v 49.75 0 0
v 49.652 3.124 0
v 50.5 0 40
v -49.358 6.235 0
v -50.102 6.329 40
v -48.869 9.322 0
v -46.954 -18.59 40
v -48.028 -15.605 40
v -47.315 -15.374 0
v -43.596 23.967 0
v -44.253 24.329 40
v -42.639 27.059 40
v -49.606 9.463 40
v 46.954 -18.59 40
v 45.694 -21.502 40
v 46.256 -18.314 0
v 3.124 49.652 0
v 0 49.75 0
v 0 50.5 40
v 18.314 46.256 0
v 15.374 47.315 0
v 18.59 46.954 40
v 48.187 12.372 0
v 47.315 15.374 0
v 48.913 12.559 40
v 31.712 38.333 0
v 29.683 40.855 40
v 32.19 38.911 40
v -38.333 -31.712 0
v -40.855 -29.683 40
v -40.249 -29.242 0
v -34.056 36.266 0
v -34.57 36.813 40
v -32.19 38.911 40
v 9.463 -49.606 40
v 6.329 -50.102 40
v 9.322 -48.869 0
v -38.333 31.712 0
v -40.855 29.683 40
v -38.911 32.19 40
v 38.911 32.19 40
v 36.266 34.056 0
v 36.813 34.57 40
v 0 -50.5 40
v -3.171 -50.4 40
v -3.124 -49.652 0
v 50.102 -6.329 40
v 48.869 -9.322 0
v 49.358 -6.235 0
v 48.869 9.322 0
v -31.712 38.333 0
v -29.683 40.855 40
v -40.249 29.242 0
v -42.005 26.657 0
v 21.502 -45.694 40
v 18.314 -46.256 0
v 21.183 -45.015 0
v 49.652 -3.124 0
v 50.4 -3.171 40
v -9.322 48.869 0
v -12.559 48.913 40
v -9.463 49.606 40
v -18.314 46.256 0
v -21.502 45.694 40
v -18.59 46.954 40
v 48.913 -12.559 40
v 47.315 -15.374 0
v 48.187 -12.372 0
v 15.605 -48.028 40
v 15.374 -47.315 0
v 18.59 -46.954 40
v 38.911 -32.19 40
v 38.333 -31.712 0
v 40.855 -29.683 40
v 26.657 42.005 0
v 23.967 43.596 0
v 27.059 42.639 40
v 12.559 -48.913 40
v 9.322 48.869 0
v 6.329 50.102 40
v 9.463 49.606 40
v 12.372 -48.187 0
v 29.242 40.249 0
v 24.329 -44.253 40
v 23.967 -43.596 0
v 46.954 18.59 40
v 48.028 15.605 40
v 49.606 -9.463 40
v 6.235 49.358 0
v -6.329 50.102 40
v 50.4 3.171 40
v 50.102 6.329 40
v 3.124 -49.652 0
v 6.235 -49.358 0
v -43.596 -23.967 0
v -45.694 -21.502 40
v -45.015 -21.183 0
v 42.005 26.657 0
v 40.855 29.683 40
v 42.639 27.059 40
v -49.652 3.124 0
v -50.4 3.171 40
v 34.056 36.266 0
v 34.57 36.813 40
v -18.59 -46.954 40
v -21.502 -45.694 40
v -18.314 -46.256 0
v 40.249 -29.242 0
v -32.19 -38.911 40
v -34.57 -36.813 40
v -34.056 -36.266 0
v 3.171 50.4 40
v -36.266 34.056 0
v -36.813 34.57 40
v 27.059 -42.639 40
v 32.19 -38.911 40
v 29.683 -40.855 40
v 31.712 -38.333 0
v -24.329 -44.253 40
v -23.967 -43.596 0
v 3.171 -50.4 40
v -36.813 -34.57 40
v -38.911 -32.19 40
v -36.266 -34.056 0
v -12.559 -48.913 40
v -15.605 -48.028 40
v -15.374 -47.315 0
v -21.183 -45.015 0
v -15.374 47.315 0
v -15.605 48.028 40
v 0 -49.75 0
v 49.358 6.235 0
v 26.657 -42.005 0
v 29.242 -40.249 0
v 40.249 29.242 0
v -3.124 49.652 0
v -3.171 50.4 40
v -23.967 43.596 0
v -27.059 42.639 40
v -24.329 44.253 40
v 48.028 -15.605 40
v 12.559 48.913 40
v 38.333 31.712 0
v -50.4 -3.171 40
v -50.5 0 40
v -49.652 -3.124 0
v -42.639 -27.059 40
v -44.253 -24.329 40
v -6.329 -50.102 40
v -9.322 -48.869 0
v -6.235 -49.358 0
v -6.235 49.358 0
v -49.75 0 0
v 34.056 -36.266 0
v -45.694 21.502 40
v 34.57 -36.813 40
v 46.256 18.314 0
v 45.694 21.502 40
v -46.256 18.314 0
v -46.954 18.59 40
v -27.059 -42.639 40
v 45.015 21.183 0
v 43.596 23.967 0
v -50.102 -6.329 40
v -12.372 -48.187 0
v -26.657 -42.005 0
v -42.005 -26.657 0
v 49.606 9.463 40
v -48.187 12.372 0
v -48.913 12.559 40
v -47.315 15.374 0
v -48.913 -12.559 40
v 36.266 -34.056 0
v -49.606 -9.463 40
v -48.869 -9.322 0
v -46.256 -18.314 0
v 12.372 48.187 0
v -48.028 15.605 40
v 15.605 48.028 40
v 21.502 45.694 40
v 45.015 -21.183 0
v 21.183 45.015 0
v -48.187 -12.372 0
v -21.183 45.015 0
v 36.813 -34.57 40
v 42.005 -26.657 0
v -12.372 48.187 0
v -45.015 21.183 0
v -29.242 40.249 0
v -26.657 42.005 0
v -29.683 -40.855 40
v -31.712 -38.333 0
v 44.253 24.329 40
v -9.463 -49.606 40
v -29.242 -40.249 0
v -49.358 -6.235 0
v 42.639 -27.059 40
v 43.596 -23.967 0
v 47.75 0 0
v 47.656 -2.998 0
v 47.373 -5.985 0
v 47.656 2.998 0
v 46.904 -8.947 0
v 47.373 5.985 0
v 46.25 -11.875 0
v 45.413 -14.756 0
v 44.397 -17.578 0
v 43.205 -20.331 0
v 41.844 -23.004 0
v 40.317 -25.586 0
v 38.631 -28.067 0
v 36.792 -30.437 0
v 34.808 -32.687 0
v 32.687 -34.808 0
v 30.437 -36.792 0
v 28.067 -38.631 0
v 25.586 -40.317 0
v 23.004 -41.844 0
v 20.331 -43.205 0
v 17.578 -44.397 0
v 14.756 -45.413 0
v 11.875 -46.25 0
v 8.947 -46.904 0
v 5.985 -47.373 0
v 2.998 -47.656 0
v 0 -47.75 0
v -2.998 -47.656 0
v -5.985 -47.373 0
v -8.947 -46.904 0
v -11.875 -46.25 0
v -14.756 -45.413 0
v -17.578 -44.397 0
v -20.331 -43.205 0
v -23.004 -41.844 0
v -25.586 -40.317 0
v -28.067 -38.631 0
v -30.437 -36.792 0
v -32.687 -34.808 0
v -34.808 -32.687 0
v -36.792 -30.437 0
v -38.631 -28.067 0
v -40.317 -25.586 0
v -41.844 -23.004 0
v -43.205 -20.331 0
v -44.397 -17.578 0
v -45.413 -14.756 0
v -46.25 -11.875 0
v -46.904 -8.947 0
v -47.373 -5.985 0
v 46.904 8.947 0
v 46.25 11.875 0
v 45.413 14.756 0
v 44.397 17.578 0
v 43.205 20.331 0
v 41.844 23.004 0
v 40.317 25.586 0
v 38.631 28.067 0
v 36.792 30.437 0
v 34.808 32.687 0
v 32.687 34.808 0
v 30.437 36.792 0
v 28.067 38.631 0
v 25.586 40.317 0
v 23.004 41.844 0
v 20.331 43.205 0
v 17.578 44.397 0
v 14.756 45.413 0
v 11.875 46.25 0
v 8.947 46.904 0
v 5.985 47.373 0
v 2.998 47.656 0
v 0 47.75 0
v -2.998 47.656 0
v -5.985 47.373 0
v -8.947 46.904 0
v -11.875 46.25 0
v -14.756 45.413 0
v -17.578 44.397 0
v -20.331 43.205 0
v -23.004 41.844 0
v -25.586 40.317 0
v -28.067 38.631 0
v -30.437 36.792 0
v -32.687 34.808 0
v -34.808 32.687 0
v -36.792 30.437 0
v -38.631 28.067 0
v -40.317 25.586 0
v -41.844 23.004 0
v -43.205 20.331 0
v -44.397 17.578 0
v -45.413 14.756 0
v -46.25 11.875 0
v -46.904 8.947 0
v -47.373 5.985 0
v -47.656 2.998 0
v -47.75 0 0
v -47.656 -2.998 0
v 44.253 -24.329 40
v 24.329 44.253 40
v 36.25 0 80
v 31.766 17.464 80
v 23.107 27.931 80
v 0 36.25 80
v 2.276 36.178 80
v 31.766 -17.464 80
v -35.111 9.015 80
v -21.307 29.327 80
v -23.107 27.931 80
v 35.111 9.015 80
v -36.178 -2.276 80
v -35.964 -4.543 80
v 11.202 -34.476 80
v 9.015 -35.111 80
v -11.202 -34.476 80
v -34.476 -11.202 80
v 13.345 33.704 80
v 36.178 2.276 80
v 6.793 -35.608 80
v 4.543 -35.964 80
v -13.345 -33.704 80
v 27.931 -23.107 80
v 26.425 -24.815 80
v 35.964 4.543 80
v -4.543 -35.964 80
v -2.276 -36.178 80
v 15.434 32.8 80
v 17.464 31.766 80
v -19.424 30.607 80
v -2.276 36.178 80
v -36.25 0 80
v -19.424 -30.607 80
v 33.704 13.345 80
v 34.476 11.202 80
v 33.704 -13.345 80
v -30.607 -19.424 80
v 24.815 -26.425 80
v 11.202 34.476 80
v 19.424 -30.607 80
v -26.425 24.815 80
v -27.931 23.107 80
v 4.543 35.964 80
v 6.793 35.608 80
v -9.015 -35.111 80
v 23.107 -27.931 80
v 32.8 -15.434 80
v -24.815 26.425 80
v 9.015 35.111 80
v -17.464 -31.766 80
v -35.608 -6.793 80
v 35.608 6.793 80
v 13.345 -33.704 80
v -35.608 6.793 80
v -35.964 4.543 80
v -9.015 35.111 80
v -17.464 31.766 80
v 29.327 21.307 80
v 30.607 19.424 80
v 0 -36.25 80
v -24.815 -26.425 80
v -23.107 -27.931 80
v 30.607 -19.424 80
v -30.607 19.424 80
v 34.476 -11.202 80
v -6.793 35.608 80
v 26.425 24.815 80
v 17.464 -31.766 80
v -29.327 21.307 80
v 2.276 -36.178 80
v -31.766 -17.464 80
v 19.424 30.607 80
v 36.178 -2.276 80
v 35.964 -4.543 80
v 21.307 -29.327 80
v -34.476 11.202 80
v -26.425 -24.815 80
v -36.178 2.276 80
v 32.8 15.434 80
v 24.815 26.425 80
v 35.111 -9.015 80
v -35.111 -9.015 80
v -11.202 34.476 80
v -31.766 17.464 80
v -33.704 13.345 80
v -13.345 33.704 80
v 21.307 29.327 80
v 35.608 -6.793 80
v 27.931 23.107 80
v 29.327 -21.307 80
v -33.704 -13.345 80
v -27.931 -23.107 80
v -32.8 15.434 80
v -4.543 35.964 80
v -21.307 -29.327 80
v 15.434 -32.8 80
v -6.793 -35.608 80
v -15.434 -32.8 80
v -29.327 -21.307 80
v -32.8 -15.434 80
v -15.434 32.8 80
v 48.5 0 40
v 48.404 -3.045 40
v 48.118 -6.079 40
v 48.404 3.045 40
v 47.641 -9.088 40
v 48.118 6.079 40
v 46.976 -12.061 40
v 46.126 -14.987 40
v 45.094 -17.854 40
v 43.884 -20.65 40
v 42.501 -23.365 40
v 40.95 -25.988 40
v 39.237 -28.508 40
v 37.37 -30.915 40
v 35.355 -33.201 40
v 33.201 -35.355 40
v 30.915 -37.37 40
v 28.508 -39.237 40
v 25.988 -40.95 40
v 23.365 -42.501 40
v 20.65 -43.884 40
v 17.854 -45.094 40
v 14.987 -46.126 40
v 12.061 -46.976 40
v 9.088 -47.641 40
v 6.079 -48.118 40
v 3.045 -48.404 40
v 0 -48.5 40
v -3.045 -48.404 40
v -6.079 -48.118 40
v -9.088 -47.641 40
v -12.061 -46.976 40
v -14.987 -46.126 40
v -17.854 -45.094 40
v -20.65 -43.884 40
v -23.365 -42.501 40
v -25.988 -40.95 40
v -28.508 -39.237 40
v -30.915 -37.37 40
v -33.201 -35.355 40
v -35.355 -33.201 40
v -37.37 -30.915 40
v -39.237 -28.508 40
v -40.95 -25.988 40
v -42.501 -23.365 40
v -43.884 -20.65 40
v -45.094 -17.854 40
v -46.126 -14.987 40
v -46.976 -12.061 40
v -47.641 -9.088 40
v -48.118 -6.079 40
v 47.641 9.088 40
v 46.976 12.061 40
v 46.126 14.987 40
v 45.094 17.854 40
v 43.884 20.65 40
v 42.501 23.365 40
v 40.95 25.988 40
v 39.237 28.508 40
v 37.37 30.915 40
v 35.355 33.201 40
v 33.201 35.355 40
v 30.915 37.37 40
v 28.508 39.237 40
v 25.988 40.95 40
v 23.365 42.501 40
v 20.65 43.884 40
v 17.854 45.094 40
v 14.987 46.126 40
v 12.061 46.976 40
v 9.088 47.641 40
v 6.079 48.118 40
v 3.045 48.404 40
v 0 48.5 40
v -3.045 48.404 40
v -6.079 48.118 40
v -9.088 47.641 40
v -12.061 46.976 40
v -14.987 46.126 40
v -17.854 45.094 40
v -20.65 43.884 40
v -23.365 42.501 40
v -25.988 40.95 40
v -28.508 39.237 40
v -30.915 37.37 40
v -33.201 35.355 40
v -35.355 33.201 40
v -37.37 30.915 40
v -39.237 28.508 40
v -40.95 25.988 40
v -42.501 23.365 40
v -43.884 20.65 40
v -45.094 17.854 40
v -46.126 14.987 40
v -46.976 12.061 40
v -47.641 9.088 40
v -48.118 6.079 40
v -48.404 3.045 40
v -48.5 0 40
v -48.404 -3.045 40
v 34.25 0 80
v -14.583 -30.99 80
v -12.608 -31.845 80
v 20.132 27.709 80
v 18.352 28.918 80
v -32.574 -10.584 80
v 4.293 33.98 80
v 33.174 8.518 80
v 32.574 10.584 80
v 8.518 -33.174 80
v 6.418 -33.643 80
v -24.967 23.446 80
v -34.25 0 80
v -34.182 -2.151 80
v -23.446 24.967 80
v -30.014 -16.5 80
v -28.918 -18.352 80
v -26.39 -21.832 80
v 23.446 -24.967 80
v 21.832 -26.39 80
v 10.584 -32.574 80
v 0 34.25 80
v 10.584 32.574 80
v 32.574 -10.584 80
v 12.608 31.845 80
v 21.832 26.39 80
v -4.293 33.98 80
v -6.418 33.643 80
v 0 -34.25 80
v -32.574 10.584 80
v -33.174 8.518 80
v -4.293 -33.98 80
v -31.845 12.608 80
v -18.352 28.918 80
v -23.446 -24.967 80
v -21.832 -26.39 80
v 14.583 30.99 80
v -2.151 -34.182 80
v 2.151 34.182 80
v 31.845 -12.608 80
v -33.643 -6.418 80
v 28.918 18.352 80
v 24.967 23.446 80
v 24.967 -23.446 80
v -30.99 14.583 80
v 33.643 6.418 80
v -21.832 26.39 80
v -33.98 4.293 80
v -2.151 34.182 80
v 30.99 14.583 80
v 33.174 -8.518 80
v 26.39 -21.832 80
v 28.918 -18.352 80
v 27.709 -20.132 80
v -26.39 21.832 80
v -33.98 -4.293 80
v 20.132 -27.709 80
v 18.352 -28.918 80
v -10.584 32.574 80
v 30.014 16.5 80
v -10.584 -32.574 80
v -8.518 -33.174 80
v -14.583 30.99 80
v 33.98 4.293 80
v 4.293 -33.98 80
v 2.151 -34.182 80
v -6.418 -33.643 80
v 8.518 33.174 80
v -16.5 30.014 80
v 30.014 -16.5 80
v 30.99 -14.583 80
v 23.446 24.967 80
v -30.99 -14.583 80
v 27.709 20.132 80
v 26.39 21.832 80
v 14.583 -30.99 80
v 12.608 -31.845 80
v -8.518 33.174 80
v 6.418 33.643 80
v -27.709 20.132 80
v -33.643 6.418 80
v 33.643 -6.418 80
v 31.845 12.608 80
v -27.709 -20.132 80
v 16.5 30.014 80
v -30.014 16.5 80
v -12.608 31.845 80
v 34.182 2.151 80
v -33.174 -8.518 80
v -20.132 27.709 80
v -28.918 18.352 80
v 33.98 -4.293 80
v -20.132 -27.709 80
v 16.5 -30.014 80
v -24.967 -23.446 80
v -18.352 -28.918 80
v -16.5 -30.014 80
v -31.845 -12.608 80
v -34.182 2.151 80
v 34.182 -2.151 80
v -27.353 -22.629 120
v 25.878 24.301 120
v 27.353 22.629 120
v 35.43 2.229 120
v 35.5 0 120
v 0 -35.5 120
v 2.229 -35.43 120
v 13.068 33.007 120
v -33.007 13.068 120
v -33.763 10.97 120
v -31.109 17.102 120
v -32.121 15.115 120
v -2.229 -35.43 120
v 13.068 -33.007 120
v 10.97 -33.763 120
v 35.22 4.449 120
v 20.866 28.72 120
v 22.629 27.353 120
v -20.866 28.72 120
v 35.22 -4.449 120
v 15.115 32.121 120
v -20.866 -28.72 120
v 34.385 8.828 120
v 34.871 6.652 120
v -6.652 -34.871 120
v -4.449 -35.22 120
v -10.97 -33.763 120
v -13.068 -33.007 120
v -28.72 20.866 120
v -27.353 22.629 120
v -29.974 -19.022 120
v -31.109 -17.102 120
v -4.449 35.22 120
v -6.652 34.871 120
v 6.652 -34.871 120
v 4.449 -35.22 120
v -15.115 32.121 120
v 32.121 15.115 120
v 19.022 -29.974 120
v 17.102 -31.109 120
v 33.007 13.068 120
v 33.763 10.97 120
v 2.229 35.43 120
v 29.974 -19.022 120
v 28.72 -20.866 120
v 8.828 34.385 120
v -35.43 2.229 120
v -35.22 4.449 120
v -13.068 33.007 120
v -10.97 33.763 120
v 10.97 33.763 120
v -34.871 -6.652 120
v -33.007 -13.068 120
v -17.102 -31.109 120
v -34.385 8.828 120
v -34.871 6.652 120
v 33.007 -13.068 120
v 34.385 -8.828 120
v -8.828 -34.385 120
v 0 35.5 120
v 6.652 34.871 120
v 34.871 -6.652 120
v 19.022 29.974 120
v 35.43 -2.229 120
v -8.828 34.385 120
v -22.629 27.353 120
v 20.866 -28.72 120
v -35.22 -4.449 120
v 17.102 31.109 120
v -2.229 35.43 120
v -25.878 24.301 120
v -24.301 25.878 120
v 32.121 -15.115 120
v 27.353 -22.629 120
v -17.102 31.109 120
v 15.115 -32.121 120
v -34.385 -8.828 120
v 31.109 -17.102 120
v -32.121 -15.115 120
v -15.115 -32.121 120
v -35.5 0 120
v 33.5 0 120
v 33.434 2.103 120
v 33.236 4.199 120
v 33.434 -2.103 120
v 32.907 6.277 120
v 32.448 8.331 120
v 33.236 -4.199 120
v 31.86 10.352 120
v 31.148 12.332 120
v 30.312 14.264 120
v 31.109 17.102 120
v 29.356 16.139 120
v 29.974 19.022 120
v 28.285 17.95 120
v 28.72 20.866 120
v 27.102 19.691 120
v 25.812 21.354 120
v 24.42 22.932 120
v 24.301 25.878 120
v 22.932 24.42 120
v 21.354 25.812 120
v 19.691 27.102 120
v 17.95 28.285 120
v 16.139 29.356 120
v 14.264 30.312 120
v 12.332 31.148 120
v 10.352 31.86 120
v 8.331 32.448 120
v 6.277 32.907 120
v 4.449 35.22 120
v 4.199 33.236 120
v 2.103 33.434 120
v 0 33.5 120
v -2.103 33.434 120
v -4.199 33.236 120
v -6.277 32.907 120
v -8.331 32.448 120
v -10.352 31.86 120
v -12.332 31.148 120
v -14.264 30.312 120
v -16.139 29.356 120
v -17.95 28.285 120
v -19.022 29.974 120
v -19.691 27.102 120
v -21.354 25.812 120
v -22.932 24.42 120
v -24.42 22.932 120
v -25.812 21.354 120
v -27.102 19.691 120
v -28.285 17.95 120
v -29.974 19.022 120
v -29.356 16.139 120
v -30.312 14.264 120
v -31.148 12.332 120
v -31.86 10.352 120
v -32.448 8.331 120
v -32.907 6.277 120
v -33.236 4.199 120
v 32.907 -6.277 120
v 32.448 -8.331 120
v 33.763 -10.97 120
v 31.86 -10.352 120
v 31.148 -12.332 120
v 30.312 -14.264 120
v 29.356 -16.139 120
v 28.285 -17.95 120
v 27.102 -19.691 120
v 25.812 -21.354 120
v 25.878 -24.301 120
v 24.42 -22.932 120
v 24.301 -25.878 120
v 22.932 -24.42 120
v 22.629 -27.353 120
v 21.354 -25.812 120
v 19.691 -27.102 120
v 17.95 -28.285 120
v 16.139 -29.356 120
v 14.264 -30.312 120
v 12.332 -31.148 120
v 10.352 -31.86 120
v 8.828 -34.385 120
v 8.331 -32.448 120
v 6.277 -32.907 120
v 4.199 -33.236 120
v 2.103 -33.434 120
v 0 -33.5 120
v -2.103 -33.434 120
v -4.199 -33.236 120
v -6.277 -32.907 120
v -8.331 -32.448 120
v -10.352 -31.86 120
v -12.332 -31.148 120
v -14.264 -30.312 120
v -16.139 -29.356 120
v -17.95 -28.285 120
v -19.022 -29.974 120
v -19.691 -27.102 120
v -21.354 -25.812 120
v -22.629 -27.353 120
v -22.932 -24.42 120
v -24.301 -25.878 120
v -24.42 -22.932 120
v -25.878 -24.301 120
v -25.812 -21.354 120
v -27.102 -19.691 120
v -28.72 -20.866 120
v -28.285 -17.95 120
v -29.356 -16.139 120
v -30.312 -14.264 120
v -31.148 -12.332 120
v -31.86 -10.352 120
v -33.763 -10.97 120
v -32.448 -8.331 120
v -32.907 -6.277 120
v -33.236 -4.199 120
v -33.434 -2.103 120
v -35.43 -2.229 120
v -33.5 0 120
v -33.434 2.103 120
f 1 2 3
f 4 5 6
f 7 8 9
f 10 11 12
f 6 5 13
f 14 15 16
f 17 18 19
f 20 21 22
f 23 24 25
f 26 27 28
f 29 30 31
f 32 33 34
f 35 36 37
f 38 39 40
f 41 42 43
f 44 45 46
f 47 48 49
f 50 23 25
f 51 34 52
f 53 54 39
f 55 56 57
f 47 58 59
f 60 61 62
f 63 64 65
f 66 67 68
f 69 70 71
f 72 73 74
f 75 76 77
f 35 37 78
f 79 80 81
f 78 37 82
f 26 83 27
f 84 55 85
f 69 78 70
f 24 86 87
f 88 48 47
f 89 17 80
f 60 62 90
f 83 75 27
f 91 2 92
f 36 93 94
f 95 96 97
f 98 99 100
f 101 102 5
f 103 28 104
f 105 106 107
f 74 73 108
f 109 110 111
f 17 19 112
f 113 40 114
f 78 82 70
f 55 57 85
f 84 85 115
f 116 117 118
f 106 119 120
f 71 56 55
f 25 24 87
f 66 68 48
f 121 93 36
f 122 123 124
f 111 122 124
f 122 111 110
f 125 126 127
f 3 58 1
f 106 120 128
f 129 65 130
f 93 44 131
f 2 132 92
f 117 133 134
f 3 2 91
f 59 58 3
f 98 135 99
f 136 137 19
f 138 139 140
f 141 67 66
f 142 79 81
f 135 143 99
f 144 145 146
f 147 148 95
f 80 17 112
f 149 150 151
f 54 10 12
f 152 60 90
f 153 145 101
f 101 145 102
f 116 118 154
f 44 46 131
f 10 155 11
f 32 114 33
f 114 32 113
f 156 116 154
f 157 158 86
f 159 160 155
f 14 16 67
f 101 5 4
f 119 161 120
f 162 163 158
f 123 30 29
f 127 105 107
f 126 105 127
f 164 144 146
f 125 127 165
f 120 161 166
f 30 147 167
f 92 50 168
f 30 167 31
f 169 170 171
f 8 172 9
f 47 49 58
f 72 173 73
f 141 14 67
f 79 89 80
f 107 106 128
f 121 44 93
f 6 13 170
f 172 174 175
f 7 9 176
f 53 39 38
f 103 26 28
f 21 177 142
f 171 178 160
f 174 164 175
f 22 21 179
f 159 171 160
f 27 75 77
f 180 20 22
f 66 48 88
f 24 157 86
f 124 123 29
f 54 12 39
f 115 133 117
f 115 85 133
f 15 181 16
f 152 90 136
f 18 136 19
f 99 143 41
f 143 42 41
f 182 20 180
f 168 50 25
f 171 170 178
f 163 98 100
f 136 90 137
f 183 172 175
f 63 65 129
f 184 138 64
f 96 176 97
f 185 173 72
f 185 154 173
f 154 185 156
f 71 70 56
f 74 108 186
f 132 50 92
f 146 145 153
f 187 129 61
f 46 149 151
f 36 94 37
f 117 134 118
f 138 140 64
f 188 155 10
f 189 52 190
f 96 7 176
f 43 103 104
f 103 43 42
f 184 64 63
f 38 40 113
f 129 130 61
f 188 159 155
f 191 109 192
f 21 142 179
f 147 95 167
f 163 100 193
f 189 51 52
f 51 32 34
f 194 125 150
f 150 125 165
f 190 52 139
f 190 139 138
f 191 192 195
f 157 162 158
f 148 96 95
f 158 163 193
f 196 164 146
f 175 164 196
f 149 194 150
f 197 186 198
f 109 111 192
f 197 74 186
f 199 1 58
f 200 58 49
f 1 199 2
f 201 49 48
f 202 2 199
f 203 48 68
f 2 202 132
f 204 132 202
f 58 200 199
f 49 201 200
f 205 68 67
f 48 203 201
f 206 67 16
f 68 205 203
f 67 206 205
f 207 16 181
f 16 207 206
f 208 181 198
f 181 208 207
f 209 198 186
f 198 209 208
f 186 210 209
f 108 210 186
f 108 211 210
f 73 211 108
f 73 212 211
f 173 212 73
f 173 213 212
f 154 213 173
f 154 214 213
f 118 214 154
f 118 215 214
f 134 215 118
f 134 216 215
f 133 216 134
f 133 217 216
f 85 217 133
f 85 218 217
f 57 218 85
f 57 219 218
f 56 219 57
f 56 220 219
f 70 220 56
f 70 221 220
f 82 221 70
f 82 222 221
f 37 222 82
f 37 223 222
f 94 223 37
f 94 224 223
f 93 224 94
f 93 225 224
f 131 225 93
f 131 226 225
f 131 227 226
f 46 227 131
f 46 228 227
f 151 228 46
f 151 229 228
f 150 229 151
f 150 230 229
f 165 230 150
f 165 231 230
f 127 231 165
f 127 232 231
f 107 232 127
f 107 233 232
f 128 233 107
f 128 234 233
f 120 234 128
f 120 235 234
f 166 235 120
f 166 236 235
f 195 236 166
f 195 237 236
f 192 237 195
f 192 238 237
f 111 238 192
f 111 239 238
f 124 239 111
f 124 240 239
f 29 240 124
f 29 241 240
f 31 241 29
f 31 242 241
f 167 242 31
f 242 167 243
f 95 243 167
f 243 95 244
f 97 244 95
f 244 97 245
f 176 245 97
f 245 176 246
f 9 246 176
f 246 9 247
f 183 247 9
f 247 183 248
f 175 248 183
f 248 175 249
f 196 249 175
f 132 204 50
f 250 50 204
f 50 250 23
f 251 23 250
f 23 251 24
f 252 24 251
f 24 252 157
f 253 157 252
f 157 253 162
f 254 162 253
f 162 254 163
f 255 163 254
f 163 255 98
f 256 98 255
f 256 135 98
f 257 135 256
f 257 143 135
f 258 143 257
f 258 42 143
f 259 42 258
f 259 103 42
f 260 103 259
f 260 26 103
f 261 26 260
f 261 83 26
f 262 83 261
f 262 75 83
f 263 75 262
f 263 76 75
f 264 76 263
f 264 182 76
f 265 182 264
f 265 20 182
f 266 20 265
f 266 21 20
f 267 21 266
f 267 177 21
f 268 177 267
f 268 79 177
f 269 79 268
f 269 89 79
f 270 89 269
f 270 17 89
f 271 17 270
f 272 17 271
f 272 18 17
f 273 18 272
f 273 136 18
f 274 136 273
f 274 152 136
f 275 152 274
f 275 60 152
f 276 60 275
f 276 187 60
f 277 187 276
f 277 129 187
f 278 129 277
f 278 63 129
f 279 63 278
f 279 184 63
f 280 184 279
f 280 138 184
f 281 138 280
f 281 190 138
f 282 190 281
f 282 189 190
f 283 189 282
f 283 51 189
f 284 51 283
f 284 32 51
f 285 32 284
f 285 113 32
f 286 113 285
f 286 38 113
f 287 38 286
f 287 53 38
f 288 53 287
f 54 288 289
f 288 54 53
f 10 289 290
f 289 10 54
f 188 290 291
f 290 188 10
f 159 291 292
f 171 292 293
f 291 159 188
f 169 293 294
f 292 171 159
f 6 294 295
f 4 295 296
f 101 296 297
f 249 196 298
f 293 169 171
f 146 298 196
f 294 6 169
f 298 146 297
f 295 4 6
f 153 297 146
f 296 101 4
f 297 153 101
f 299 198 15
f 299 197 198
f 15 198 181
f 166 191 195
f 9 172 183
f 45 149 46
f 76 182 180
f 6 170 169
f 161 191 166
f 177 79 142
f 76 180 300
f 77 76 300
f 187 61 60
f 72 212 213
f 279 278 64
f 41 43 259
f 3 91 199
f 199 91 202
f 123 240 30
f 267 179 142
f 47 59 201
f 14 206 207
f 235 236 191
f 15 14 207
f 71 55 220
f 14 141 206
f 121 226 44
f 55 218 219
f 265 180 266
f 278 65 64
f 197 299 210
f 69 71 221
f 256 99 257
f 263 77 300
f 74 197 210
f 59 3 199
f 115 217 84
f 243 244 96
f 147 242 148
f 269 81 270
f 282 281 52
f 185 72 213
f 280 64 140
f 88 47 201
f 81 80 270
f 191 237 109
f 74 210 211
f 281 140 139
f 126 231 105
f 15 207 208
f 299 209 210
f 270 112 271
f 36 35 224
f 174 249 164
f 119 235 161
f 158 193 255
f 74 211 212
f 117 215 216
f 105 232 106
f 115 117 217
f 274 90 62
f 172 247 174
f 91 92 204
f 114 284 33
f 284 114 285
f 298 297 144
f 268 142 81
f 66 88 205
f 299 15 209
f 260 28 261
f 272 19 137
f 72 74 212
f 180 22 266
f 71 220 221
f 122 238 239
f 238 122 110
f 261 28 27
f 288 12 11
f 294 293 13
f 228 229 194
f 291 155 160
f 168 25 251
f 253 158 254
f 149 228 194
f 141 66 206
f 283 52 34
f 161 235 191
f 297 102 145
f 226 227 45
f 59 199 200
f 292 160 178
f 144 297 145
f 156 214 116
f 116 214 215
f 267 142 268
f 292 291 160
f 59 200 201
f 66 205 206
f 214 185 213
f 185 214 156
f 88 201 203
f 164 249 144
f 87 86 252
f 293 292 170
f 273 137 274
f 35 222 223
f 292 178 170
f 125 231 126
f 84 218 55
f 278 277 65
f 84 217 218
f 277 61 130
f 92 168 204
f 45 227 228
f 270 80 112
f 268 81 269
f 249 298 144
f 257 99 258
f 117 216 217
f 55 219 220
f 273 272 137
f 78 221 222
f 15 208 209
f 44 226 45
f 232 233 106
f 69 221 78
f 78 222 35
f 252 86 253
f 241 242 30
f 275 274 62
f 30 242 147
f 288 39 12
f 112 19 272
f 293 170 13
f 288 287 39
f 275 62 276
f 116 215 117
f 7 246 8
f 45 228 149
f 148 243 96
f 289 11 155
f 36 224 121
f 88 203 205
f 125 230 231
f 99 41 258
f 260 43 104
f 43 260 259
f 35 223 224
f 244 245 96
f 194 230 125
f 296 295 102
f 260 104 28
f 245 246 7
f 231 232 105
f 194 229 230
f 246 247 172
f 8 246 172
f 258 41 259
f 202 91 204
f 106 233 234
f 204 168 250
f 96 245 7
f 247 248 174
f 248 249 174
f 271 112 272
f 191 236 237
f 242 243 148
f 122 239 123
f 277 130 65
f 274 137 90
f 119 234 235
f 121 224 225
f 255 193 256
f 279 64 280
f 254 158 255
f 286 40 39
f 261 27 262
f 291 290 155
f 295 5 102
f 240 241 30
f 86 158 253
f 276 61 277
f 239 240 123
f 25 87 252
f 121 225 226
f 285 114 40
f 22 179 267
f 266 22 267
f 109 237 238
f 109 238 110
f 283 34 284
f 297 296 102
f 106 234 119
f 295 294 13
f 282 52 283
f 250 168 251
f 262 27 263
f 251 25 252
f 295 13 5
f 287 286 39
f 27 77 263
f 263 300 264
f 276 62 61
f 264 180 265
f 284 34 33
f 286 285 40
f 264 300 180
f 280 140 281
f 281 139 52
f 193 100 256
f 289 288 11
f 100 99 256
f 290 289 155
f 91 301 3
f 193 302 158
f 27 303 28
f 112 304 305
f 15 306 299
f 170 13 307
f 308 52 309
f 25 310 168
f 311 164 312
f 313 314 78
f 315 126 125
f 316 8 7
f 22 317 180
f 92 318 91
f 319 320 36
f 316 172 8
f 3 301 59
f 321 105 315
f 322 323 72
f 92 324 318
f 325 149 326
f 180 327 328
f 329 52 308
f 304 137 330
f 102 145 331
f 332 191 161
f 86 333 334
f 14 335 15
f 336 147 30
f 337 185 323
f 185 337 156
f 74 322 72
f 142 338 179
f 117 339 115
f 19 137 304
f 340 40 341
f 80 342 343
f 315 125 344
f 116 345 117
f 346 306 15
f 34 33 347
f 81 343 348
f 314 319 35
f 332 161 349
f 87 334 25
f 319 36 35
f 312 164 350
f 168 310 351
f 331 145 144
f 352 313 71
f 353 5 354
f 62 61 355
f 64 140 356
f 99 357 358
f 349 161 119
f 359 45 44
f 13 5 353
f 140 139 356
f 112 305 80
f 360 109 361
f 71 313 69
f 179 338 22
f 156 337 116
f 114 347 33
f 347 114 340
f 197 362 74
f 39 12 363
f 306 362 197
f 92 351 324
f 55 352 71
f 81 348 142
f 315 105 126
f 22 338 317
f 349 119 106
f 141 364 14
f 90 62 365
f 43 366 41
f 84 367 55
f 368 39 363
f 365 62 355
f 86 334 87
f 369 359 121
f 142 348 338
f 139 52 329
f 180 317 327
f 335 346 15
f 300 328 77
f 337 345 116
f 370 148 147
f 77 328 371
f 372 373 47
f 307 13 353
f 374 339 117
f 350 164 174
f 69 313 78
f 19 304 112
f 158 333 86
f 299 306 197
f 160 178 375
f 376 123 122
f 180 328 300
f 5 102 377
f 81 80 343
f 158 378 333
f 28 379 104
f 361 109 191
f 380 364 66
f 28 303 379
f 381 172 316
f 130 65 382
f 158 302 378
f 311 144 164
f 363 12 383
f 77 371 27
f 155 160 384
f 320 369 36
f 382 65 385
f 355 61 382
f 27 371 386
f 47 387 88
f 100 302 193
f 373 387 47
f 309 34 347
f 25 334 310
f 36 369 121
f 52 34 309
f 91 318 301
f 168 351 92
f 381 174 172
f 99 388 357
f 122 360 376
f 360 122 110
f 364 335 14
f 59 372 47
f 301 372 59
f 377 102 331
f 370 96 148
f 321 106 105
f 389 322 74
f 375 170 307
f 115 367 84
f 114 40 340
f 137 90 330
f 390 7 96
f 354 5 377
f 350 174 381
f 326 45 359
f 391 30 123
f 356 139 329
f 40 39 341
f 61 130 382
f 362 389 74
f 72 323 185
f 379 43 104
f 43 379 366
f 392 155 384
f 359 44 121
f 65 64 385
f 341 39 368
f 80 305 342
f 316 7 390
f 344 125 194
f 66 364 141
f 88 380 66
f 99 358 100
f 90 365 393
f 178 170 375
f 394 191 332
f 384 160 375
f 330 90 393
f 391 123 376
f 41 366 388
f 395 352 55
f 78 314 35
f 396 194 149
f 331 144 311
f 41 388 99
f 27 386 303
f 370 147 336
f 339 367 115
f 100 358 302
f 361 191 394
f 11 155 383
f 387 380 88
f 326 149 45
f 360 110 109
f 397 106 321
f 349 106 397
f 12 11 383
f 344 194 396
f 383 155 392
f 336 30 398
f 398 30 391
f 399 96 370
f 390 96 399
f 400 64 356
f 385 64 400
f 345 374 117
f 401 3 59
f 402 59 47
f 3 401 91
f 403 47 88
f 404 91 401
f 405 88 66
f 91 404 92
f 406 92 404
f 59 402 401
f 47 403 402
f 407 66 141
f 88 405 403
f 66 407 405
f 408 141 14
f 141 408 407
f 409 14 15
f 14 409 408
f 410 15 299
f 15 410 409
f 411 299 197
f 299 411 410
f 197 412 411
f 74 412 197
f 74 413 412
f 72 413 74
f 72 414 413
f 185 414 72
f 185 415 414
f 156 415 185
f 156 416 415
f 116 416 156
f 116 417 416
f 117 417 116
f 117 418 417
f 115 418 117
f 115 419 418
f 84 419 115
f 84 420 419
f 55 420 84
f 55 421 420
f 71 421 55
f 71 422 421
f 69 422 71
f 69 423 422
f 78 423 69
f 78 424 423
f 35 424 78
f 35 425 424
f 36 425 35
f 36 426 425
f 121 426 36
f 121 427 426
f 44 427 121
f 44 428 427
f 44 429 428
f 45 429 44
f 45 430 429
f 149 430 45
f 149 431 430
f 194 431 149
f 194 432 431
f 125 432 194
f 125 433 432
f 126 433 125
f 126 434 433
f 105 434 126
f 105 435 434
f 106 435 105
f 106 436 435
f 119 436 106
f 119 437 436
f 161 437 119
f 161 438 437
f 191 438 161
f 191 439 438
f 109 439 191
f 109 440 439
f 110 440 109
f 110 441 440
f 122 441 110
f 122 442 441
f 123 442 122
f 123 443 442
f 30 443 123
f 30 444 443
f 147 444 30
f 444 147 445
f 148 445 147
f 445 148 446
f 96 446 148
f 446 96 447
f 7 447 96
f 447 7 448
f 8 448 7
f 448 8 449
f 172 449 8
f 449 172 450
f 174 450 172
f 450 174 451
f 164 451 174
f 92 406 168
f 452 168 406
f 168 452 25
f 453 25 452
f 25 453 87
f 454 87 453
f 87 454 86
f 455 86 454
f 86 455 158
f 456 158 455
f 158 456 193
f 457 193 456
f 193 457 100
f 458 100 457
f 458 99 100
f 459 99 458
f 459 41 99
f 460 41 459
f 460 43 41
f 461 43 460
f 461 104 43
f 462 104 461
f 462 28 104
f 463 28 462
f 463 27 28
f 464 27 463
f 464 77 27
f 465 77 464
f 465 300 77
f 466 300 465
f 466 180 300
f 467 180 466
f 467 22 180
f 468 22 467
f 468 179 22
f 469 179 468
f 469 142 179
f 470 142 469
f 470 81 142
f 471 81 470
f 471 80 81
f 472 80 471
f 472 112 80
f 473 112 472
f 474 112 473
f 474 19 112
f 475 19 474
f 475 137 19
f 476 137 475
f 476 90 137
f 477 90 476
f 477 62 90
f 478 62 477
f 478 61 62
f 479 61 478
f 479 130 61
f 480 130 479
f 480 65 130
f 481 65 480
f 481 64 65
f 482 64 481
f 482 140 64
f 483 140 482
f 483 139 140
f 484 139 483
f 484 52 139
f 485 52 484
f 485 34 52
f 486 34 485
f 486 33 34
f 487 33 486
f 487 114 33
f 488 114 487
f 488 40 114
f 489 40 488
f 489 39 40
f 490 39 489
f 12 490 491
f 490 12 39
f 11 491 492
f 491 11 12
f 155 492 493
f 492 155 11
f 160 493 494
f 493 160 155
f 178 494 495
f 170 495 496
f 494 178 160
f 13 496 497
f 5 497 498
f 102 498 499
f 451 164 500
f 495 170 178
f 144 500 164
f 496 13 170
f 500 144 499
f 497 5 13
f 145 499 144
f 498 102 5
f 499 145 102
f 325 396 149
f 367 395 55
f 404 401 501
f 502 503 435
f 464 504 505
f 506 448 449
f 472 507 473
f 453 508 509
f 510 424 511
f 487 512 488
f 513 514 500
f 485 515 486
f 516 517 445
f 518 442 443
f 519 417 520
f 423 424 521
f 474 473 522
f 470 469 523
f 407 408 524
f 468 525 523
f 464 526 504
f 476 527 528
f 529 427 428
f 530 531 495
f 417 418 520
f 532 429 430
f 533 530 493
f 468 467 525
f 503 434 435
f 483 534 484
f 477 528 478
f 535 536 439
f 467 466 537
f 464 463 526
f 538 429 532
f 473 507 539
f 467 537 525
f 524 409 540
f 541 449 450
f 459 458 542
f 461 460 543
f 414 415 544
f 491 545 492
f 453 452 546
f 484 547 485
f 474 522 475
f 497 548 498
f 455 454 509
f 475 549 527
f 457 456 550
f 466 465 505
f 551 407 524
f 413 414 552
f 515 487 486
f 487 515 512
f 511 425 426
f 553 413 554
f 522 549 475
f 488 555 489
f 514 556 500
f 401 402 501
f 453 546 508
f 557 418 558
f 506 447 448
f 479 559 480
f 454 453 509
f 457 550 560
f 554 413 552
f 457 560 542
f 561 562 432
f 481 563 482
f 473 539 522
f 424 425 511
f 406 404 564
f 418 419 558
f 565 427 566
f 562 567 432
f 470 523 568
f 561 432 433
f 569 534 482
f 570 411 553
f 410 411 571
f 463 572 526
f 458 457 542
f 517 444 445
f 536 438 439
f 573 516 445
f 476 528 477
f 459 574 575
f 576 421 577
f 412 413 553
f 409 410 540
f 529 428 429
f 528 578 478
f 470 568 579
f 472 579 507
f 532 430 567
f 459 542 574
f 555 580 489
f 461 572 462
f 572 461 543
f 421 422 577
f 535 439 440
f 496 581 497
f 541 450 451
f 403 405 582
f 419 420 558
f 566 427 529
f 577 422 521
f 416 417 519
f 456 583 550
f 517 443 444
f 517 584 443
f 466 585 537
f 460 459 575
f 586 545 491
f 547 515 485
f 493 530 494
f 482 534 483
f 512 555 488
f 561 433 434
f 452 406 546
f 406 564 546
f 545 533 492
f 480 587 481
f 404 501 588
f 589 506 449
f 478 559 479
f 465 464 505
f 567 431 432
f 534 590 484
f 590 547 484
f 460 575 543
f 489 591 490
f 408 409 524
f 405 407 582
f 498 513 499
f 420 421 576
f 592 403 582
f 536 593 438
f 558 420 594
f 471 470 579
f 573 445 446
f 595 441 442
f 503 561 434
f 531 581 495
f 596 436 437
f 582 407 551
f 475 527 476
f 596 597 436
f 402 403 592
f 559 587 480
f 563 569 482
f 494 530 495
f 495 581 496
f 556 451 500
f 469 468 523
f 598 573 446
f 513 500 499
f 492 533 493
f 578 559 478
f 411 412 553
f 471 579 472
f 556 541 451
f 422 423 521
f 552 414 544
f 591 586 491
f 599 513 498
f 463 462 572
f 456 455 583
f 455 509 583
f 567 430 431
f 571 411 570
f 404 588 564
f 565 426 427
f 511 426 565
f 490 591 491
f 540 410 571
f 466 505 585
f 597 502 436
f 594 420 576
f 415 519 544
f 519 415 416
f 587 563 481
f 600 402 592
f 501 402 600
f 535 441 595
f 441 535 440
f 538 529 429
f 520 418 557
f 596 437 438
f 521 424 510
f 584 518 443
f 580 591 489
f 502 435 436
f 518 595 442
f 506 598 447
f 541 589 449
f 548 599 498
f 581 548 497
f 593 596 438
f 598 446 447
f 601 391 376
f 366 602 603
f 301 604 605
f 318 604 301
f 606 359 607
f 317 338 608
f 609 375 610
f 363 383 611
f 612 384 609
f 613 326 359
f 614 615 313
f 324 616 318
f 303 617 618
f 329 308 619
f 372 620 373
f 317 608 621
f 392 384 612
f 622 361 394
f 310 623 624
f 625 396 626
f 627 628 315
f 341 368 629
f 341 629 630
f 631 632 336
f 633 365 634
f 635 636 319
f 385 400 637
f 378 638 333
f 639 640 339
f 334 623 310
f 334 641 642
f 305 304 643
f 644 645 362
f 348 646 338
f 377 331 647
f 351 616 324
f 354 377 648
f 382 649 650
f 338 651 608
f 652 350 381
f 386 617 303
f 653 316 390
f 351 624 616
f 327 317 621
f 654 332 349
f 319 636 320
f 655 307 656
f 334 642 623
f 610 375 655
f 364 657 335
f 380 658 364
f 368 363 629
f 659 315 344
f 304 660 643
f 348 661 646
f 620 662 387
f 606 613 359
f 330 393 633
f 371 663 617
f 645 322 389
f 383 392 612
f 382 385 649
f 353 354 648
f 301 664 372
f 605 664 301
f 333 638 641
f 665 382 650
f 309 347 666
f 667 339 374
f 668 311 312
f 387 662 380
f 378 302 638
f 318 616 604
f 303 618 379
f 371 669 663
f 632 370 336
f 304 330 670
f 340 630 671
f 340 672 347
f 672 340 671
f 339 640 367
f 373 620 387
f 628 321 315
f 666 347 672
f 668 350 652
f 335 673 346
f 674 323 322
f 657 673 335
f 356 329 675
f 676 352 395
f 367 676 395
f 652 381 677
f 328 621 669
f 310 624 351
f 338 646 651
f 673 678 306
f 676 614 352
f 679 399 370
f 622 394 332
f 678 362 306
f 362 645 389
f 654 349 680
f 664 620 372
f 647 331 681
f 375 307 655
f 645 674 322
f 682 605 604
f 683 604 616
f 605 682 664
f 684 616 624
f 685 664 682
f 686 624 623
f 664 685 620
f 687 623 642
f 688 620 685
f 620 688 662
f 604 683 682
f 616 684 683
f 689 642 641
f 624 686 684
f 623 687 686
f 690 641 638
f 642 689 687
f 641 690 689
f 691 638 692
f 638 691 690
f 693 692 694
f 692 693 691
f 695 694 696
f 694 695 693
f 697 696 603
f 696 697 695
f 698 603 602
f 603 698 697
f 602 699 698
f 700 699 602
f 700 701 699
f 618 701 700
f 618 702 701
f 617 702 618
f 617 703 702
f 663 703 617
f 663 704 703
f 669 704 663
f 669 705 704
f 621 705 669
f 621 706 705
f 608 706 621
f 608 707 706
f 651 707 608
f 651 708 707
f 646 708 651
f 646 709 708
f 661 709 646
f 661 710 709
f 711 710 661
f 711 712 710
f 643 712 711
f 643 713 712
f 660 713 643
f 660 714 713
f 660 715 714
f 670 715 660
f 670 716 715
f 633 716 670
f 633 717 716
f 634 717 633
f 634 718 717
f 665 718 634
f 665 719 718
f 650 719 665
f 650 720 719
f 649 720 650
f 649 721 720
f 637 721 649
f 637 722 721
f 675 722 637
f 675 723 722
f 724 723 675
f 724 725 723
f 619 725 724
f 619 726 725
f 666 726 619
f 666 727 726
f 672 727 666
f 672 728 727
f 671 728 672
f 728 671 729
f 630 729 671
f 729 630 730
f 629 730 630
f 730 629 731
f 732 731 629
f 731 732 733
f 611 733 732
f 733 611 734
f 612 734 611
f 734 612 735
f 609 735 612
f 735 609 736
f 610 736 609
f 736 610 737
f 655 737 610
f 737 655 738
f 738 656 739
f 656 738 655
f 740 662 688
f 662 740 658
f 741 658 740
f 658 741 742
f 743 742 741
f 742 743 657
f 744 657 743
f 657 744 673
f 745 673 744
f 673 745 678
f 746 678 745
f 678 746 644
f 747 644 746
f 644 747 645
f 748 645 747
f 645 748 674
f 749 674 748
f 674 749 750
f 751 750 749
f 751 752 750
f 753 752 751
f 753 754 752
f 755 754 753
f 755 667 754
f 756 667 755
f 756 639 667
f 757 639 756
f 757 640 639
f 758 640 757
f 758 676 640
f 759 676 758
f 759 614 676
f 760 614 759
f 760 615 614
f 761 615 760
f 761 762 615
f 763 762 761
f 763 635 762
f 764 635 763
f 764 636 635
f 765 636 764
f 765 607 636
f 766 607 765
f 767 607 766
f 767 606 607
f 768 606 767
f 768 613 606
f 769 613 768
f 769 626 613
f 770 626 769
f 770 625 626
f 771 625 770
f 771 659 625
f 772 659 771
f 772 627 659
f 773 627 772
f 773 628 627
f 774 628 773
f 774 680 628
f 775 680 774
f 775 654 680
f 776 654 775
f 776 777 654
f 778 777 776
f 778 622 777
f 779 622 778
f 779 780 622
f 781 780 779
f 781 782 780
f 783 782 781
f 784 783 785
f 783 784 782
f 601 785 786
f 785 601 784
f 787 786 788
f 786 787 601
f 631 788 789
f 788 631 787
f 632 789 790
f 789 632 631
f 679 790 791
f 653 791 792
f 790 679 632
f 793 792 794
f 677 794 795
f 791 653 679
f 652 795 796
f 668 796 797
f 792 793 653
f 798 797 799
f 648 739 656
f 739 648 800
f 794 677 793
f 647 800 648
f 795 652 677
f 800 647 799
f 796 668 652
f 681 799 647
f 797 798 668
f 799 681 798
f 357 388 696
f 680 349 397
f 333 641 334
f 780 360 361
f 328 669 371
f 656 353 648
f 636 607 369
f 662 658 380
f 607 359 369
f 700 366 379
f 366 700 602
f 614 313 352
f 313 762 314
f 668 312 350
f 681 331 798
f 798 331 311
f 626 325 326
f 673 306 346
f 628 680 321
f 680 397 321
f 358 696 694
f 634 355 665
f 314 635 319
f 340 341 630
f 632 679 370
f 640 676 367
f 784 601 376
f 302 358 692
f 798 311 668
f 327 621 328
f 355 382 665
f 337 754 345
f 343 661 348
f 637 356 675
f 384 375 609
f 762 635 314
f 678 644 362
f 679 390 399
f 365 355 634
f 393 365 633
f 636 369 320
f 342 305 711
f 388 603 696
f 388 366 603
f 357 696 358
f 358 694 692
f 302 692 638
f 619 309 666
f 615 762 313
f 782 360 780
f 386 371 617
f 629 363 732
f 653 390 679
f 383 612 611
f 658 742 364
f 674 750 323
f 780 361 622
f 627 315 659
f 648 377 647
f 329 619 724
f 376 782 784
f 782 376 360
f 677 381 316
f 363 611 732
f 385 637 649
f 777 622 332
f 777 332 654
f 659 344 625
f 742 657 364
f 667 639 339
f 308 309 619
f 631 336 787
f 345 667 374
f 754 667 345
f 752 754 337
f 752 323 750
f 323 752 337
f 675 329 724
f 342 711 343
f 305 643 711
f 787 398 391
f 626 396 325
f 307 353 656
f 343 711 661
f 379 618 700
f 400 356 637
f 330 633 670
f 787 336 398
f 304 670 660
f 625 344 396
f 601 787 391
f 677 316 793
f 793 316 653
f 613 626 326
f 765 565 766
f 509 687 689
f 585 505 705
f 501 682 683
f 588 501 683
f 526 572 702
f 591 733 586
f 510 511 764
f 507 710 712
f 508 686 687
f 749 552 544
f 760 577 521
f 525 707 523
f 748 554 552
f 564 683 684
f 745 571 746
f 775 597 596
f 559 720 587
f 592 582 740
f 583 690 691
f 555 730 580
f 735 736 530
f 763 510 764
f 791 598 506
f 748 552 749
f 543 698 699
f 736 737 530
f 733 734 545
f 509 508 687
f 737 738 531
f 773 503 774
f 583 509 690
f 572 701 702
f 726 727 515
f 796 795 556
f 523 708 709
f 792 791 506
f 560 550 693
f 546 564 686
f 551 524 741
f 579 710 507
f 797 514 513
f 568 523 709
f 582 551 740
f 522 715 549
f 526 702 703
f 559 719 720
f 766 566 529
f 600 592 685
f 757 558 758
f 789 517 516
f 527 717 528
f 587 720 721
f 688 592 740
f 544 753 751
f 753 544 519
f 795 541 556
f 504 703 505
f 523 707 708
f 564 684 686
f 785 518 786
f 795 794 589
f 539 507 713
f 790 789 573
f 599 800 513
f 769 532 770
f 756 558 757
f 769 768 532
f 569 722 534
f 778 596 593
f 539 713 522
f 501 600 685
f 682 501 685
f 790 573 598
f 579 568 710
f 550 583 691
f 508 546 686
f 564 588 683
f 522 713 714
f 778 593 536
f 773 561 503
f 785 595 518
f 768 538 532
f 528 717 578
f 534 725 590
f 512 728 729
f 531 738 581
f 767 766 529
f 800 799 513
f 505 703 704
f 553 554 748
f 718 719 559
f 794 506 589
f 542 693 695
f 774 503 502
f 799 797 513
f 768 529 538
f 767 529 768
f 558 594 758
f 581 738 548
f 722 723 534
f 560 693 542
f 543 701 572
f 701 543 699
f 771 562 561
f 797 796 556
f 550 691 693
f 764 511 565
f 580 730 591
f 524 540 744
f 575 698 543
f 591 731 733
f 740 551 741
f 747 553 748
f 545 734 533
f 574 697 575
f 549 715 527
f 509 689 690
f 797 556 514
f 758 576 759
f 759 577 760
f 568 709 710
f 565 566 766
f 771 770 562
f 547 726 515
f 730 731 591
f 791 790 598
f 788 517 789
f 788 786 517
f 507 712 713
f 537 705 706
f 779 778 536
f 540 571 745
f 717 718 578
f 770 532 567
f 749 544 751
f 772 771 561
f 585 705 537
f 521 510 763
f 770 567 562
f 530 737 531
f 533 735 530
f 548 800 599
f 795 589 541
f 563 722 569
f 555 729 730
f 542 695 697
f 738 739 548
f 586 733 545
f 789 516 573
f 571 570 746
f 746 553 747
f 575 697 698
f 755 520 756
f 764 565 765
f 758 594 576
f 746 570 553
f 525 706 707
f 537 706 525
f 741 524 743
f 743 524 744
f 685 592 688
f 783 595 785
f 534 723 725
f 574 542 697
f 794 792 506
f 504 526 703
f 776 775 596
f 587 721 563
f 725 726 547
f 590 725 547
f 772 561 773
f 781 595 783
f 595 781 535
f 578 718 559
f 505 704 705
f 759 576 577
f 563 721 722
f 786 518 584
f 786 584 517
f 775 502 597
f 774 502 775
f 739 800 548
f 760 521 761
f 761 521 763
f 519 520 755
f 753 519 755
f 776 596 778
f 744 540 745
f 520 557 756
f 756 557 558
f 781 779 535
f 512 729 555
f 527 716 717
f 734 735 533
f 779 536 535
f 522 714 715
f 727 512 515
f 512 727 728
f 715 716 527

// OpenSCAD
$fn=100;
wall_thickness = 2;
section_length = 40;
end_taper = 1.5;

start_ext_dia = 101.0;
start_int_dia = start_ext_dia - 2 * wall_thickness;

end_ext_dia = 72.5;
end_int_dia = end_ext_dia - 2 * wall_thickness;


module start_tube() {
    difference() {
        cylinder(section_length, d1 = start_ext_dia - end_taper, d2 = start_ext_dia);
        cylinder(section_length, d1 = start_int_dia - end_taper, d2 = start_ext_dia);
    }
}

module middle_tube() {
    difference() {
        cylinder(section_length, d1 = start_ext_dia, d2 = end_ext_dia);
        cylinder(section_length, d1 = start_int_dia, d2 = end_int_dia);
    }
}

module end_tube() {
    difference() {
        cylinder(section_length, d1 = end_ext_dia, d2 = end_ext_dia-end_taper);
        cylinder(section_length, d1 = end_int_dia, d2 = end_int_dia-end_taper);
    }
}

module adaptor() {
    start_tube();
    translate([0, 0, section_length]) middle_tube();
    translate([0, 0, section_length*2]) end_tube();    
}


adaptor();
    
    
